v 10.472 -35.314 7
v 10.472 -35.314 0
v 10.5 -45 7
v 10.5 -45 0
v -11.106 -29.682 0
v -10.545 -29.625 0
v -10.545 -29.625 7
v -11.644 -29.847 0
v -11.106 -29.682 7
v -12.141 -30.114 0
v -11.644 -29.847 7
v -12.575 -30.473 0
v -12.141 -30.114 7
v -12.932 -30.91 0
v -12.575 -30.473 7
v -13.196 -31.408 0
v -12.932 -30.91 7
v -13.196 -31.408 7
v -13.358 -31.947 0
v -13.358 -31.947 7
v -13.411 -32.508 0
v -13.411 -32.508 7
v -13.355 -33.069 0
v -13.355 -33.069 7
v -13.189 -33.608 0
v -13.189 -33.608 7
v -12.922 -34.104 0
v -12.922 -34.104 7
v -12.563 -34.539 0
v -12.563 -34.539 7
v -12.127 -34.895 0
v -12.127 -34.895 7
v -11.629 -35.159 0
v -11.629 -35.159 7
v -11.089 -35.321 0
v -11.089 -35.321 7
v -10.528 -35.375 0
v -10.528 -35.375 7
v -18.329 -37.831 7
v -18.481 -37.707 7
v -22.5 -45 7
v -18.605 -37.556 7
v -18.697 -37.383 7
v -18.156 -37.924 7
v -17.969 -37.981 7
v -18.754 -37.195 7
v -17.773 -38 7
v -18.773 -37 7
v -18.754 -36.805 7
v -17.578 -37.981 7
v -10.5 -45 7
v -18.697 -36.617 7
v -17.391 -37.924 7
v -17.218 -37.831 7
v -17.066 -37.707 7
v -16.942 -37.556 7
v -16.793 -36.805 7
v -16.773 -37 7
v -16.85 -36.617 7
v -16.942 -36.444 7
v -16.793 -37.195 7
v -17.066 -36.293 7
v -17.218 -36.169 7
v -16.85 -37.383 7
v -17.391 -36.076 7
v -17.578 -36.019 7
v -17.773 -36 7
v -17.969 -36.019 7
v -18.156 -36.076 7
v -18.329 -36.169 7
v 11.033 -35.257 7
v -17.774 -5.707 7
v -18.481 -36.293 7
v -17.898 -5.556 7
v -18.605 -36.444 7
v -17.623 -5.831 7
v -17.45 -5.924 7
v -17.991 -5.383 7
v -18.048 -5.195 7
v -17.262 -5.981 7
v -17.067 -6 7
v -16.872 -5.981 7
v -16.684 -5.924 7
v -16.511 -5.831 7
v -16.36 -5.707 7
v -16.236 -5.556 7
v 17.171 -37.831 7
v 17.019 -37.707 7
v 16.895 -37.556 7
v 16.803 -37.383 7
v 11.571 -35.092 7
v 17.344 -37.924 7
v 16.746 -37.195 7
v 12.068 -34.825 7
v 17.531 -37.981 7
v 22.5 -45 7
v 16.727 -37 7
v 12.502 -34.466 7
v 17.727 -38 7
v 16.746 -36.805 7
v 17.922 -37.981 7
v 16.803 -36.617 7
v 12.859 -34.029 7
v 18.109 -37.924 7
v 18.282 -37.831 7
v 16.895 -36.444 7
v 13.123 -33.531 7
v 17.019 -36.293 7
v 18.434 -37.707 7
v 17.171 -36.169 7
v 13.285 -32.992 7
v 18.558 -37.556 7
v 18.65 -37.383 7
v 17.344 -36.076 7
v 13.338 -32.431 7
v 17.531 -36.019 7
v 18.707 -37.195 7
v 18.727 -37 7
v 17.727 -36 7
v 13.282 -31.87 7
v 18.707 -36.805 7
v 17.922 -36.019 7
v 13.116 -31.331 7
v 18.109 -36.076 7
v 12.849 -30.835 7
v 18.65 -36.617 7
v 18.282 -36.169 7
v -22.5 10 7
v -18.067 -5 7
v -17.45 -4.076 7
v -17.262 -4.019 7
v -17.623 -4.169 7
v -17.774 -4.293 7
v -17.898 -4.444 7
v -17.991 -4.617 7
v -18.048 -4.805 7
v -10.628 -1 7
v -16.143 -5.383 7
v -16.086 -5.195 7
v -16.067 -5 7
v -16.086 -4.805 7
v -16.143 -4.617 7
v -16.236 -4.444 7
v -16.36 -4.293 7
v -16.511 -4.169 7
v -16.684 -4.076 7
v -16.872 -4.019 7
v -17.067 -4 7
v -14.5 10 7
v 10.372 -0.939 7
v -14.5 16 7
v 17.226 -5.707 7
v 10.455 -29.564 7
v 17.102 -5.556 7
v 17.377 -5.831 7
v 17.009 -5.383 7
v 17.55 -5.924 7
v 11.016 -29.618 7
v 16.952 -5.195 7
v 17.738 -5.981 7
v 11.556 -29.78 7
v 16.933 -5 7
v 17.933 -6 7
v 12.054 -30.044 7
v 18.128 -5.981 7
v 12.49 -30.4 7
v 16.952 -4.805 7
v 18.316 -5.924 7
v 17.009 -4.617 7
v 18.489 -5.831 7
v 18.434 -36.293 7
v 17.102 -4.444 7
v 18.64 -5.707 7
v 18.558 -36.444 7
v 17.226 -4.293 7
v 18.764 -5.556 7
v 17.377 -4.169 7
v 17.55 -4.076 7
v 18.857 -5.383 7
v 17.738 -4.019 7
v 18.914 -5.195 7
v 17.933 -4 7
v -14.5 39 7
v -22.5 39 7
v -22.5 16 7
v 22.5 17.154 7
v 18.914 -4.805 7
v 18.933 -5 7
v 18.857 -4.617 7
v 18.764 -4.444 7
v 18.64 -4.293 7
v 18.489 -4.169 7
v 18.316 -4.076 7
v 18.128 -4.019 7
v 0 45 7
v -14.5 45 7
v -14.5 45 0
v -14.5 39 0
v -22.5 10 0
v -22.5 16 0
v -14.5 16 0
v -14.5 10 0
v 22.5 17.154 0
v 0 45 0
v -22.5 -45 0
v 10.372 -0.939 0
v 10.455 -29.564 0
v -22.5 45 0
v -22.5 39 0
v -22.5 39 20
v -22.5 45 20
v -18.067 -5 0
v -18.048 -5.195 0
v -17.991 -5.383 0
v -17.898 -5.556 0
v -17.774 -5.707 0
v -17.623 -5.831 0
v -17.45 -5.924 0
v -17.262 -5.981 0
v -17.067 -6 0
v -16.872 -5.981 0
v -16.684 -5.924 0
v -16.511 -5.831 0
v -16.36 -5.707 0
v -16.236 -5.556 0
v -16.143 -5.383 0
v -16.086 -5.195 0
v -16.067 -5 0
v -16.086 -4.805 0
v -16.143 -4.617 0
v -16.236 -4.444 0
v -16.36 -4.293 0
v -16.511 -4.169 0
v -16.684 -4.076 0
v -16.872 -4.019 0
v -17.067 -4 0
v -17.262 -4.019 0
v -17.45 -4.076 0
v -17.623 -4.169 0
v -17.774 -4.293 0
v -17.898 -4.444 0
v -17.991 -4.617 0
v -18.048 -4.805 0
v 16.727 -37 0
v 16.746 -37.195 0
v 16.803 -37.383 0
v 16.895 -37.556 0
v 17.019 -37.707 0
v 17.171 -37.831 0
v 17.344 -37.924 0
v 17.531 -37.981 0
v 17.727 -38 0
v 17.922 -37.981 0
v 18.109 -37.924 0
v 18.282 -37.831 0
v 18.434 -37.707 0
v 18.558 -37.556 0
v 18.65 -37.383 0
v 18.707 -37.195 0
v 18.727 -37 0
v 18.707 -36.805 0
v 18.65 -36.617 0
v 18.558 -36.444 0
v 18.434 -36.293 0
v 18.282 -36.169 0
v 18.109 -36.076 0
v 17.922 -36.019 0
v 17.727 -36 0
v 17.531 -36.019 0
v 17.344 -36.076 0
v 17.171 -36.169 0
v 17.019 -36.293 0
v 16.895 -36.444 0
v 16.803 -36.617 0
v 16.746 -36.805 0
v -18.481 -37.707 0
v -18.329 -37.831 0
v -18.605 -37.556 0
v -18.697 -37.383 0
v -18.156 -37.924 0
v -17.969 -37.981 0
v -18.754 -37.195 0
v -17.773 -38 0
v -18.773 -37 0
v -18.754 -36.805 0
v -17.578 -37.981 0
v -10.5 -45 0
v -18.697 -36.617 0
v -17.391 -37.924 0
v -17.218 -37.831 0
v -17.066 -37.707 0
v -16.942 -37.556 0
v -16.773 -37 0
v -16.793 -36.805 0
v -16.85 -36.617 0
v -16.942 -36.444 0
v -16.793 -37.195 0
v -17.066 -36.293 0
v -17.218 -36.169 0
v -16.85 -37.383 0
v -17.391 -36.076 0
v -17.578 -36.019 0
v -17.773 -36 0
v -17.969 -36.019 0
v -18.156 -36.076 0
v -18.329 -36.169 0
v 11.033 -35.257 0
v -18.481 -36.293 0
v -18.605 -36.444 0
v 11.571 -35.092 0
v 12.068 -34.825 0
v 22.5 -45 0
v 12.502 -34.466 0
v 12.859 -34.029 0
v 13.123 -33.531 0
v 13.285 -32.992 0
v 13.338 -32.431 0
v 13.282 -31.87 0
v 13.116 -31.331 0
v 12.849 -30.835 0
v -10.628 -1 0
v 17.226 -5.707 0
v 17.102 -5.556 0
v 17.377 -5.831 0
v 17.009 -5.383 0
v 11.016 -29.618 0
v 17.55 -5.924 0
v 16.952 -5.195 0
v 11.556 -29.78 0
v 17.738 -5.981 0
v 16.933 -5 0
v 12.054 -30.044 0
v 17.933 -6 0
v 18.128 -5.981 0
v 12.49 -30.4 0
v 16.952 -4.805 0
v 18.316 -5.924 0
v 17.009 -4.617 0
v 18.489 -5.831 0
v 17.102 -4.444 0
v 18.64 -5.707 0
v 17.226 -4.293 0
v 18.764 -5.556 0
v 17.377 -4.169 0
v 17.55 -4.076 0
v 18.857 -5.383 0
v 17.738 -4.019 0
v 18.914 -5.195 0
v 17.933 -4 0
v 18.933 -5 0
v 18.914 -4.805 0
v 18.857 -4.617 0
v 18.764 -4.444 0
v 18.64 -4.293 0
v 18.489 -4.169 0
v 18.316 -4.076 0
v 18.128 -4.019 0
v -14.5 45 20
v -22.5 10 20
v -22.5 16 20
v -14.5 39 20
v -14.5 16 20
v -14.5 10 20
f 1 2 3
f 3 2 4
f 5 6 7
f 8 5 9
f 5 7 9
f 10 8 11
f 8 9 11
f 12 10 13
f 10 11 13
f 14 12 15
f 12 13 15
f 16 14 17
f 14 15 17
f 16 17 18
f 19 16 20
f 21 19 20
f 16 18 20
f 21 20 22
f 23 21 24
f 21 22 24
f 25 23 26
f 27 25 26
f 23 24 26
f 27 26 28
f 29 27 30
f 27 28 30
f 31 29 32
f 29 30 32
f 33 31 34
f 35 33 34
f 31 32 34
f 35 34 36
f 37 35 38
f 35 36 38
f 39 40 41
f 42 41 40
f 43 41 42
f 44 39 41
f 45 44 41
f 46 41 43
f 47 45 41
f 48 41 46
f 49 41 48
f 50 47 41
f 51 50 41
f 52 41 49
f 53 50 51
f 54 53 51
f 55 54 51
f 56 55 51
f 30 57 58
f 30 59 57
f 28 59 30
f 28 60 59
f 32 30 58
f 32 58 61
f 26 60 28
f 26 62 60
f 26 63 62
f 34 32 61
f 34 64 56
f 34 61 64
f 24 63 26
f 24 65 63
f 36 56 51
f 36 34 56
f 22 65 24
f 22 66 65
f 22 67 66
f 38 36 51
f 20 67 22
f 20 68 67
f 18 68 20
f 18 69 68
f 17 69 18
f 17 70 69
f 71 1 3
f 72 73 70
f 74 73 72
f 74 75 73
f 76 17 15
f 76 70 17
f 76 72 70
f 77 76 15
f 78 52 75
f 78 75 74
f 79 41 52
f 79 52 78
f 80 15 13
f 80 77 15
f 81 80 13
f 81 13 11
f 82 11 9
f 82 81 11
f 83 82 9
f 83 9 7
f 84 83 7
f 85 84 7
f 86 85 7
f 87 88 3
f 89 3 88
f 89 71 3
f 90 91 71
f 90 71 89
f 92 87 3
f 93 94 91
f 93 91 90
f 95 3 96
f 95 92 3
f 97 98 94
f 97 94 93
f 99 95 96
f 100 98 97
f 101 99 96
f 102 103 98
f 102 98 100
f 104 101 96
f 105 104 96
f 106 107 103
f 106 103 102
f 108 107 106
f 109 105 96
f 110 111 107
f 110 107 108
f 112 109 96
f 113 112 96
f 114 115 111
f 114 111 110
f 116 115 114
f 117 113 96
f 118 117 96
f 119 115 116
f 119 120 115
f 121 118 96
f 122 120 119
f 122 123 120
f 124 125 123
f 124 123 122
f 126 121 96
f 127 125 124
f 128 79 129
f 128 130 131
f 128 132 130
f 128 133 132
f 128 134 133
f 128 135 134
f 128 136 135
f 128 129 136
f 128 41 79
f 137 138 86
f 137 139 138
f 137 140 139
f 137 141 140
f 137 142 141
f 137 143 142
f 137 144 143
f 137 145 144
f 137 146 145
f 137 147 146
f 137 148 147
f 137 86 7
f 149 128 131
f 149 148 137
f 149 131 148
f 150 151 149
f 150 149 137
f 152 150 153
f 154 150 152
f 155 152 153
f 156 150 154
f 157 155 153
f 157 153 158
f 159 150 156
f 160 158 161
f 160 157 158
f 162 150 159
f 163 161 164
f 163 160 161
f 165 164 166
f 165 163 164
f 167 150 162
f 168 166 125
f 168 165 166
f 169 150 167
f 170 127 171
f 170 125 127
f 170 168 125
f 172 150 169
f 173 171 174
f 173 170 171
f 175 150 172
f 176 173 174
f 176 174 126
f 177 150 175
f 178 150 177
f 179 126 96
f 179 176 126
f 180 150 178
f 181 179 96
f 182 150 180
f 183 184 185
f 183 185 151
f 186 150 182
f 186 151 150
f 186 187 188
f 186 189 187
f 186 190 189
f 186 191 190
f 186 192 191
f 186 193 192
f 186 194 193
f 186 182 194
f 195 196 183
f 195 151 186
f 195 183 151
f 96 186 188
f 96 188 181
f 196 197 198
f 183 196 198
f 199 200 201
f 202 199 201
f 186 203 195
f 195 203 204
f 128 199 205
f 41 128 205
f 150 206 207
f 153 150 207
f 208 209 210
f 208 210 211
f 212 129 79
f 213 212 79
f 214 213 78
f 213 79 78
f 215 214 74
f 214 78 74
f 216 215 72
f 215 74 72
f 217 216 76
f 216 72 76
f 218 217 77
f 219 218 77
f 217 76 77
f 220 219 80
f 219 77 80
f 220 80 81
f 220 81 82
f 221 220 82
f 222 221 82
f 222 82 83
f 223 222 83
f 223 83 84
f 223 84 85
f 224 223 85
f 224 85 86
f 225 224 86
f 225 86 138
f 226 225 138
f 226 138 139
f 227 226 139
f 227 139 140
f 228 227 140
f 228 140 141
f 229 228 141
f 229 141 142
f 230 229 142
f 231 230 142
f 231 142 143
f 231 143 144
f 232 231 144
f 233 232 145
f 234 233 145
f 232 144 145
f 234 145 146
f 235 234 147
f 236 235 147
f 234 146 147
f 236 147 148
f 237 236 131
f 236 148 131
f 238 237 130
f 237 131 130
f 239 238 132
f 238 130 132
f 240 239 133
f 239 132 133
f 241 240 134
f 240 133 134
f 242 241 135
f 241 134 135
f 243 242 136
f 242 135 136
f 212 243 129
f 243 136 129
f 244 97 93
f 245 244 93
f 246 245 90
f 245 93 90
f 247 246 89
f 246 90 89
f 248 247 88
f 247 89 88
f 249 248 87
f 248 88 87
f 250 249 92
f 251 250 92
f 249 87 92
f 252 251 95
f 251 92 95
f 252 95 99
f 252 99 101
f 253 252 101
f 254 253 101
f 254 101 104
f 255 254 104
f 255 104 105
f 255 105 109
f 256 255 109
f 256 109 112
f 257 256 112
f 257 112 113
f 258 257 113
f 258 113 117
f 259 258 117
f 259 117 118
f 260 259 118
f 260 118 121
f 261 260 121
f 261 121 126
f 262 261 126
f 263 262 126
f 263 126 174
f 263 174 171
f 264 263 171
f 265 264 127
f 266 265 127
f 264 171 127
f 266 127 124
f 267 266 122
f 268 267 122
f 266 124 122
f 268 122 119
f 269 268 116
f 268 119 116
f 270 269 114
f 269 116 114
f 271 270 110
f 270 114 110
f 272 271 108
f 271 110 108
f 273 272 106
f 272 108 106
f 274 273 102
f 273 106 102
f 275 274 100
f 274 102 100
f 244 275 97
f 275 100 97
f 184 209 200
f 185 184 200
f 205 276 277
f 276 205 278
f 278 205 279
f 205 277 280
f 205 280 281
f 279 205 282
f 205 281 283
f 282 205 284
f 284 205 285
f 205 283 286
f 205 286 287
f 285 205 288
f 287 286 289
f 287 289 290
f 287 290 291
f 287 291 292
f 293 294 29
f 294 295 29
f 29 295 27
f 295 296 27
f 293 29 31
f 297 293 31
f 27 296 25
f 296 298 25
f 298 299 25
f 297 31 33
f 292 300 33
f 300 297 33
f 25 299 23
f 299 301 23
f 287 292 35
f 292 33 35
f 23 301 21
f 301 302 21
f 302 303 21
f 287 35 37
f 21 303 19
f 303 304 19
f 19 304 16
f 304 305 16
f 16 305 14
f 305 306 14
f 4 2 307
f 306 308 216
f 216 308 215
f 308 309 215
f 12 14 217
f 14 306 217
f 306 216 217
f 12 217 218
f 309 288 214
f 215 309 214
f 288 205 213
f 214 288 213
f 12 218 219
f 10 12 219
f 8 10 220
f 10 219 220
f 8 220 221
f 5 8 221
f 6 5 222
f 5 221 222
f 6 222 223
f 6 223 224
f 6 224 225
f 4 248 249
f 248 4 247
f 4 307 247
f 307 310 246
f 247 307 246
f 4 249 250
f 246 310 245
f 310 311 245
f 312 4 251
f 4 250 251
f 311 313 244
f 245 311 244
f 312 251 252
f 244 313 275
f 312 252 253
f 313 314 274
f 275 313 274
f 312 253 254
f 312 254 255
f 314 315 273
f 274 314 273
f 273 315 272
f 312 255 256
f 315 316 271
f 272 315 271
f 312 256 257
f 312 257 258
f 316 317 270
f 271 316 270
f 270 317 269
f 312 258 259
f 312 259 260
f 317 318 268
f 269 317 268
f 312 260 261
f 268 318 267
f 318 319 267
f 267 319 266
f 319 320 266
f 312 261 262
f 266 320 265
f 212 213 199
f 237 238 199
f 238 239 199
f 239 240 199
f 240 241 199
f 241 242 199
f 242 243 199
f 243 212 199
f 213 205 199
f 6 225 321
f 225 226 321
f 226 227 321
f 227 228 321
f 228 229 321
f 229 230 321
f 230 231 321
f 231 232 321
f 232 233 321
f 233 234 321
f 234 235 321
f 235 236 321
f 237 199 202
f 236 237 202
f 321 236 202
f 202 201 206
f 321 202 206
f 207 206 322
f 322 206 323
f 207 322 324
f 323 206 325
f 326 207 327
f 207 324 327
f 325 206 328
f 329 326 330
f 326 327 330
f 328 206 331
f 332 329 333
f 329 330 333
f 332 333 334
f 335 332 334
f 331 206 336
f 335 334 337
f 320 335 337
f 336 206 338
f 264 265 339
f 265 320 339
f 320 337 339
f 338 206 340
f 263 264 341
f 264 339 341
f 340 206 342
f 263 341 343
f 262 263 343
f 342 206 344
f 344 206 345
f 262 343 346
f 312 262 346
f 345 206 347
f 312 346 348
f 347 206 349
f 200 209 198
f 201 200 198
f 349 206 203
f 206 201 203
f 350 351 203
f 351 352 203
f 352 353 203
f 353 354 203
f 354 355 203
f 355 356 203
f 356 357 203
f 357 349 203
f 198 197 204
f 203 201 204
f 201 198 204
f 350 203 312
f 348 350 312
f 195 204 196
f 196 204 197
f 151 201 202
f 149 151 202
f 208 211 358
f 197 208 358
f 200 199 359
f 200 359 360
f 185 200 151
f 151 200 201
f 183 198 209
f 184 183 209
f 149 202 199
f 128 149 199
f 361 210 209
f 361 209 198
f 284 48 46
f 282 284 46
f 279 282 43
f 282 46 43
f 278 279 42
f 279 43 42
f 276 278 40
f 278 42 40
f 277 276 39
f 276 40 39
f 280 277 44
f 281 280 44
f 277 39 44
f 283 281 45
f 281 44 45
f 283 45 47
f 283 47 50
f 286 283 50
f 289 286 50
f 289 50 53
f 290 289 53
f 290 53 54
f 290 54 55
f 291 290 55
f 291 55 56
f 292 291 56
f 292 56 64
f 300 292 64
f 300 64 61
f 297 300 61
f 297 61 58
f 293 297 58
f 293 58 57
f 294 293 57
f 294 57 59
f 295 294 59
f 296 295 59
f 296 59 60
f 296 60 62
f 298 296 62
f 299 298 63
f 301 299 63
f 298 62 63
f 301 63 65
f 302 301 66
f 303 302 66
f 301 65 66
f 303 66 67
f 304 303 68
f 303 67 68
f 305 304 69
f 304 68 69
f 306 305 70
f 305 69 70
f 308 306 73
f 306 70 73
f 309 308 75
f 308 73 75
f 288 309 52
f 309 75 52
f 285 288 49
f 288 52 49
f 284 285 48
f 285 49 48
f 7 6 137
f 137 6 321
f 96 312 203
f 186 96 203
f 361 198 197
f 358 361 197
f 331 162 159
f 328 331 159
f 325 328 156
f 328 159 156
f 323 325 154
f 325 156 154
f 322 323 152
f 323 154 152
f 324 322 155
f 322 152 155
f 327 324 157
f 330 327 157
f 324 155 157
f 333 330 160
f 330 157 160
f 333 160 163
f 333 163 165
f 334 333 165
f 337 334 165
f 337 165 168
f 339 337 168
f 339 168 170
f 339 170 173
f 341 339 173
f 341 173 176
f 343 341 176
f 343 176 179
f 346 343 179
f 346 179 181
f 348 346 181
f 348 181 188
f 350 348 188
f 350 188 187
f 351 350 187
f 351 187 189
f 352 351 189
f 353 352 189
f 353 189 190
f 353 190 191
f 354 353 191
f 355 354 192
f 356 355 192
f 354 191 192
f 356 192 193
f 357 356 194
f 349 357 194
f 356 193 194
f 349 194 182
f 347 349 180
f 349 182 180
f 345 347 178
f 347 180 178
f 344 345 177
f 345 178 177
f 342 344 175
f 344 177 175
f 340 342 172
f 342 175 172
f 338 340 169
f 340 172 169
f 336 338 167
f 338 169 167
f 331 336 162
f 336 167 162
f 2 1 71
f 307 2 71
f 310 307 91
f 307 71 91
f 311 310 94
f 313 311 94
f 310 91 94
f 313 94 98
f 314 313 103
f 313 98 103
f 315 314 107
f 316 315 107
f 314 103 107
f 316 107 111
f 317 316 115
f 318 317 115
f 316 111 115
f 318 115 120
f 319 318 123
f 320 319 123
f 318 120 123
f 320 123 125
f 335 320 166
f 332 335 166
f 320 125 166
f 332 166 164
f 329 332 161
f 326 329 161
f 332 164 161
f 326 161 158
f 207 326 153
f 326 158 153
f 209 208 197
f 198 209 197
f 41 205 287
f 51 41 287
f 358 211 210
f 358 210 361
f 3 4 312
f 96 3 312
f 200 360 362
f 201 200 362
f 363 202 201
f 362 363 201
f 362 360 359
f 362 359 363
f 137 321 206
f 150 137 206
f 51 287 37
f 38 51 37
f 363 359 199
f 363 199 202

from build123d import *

# Parameters (mm, degrees)
F0_W     = 8
F0_H     = 6
F1_DEPTH = 20
F2_DEPTH = 20
F3_DEPTH = 7
F4_D     = 2
F5_D     = 5.75


with BuildPart() as f1:
    # F0 (on Top) → F1 (new body)
    with BuildSketch(Plane.XY):
        with Locations((-18.5, 42)):
            Rectangle(F0_W, F0_H)
    extrude(amount=F1_DEPTH)


with BuildPart() as f2:
    # F0 (on Top) → F2 (new body)
    with BuildSketch(Plane.XY):
        with Locations((-18.5, 13)):
            Rectangle(F0_W, F0_H)
    extrude(amount=F2_DEPTH)


with BuildPart() as f3:
    # F0 (on Top) → F3 (new body)
    with BuildSketch(Plane.XY):
        Polygon((10.5, -45), (22.5, -45), (22.5, 17.153987661), (0, 45), (-14.5, 45), (-14.5, 39), (-22.5, 39), (-22.5, 16), (-14.5, 16), (-14.5, 10), (-22.5, 10), (-22.5, -45), (-10.5000890097, -45), (-10.6281967604, -1.0001864958), (10.3717142302, -0.9390441602), align=None)
    extrude(amount=F3_DEPTH)

    # F4 (through all)
    with Locations(Plane(origin=(0, 0, 0), x_dir=(1, 0, 0), z_dir=(0, 0, -1))):
        with Locations((-17.0669870824, 5), (-17.7734121563, 37), (17.7265878437, 37), (17.9330129176, 5)):
            Hole(F4_D / 2)

    # F5 (through all)
    with Locations(Plane(origin=(0, 0, 0), x_dir=(1, 0, 0), z_dir=(0, 0, -1))):
        with Locations((-10.5364832571, 32.5000529818), (10.4634277335, 32.4389106462)):
            Hole(F5_D / 2)


solid = Compound([f1.part, f2.part, f3.part])
